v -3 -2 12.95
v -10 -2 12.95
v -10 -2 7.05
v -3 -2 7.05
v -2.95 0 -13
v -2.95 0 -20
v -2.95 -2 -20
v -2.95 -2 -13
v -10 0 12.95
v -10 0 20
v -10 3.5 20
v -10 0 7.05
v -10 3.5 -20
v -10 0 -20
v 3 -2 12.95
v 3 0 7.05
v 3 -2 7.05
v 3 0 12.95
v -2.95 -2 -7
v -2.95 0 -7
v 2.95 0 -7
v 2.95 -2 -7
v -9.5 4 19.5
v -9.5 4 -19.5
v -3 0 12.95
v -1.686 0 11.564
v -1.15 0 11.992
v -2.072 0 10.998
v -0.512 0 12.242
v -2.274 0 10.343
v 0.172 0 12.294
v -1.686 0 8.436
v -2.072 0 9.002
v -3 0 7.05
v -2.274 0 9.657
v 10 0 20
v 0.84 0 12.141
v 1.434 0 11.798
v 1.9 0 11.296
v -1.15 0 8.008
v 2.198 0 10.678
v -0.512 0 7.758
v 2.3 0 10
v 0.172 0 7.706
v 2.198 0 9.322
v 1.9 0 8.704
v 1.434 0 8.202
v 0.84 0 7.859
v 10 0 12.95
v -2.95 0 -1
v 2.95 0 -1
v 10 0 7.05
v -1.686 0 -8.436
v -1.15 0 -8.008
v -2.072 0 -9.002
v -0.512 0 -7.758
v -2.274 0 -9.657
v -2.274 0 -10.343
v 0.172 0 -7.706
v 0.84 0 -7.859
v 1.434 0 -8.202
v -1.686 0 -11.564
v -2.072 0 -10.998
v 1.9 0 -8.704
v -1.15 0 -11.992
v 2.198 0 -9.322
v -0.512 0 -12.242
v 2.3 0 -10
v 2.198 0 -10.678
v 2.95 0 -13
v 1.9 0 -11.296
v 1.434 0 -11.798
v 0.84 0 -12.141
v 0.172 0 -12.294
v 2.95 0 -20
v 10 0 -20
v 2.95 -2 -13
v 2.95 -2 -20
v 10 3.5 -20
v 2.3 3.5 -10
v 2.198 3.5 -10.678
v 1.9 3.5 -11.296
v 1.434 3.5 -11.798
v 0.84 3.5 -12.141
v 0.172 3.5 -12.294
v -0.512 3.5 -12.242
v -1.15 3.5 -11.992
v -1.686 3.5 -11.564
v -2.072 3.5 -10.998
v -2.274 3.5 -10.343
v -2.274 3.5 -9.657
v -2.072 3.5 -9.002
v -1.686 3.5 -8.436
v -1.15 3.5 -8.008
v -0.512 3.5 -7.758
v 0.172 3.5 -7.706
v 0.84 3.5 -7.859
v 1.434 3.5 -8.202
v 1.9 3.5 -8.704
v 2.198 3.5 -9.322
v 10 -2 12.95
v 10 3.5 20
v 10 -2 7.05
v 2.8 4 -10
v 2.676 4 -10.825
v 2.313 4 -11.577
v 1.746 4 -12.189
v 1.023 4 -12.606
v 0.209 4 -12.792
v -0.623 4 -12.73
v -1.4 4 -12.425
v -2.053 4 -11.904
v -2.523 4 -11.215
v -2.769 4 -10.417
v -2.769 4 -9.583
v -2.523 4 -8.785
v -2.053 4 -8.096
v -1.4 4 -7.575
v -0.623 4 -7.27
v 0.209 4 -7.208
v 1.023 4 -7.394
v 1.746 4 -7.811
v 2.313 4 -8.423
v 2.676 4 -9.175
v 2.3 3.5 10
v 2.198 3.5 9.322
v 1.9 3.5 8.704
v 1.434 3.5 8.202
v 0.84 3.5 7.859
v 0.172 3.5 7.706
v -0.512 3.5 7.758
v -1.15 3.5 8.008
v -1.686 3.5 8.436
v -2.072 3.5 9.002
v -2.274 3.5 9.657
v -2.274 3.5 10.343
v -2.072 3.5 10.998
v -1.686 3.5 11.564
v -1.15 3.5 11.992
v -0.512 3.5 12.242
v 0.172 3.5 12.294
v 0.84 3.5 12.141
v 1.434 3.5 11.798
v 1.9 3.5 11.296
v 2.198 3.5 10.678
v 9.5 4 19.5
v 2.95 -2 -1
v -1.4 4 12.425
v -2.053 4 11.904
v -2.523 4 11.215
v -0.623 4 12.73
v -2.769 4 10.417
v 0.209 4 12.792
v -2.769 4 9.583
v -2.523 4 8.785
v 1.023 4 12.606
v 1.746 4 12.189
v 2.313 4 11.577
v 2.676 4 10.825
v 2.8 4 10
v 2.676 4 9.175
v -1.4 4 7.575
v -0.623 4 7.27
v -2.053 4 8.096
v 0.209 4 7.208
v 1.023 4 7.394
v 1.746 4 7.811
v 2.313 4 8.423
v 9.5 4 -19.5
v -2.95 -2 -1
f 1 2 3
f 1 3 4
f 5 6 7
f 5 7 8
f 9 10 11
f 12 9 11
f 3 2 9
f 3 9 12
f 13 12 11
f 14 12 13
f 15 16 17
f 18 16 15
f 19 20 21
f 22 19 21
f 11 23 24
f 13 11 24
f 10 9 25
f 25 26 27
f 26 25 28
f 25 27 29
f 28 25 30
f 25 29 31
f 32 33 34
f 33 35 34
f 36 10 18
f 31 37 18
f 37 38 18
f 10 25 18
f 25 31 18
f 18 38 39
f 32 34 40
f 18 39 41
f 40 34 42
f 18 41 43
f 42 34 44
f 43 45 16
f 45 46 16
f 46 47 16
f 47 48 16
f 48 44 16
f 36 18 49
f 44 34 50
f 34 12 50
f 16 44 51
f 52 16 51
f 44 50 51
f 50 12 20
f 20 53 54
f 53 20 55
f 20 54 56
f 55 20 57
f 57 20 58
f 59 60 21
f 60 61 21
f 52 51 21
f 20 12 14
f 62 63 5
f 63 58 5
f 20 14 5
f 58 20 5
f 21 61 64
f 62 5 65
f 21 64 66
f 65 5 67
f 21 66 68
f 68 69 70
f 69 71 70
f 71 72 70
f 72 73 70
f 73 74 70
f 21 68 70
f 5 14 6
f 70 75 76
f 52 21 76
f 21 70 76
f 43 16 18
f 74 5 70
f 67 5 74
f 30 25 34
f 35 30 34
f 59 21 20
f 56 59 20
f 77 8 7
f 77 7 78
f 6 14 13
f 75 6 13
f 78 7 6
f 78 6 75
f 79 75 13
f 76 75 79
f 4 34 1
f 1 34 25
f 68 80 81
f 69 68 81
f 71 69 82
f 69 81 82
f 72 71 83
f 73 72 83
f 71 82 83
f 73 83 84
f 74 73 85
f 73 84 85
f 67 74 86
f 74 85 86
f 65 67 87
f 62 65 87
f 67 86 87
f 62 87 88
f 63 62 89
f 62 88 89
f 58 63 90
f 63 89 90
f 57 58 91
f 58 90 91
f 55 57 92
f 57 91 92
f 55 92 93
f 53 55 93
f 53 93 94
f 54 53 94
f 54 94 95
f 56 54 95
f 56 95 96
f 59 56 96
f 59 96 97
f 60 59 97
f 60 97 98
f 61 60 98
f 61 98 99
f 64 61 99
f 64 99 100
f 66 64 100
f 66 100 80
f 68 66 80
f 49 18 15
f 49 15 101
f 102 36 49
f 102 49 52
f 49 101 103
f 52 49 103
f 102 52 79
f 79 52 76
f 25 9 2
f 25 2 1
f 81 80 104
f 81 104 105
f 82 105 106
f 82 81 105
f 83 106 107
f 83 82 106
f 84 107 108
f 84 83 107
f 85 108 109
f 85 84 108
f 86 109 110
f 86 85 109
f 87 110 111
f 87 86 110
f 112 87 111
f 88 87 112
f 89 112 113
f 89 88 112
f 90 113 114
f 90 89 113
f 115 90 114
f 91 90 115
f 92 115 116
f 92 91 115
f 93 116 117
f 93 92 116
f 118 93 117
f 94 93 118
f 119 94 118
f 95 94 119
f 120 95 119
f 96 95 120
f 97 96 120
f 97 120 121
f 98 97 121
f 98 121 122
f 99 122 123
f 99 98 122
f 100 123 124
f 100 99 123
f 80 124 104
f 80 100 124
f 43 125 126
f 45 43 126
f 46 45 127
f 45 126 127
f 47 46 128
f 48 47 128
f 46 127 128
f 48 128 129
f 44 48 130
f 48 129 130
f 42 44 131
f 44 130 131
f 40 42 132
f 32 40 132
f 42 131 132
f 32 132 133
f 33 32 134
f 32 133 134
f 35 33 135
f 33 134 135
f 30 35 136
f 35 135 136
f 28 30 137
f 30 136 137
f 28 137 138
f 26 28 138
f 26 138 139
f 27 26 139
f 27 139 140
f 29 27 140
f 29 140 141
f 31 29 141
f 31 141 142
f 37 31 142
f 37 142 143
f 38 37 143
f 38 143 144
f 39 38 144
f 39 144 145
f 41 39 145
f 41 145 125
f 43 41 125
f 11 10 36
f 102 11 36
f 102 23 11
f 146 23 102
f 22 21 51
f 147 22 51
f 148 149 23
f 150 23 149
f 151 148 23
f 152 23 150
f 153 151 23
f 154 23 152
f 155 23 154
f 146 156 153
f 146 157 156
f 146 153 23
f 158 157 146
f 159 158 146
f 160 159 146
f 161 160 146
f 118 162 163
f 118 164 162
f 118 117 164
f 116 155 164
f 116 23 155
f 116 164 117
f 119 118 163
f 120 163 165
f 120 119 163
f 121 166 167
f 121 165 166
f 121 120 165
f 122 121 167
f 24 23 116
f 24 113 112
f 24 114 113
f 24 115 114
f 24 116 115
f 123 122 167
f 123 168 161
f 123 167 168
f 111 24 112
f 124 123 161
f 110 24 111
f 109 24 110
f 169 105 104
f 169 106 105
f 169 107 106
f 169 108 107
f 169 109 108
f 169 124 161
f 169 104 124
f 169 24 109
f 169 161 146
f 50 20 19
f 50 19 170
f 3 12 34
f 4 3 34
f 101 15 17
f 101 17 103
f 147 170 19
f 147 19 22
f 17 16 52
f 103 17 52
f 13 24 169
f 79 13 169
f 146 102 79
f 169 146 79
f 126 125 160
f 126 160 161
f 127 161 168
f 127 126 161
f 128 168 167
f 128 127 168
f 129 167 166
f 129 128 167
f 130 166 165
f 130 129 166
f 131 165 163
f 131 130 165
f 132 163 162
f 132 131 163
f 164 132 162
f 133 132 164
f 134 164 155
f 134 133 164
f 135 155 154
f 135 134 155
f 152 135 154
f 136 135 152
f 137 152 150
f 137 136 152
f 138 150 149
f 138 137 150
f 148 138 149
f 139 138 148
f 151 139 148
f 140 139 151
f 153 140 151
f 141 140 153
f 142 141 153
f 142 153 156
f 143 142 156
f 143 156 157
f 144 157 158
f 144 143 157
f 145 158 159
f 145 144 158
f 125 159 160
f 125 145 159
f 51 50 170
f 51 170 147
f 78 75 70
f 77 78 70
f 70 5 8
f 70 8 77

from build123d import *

# Parameters (mm, degrees)
ESBO_O1_W                  = 20
ESBO_O1_H                  = 40
RESSALTO_EXTRUS_O1_DEPTH   = 4
ESBO_O2_R                  = 2.3
CORTE_EXTRUS_O1_DEPTH      = 1
CORTE_EXTRUS_O1_DEPTH_BACK = 5
ESBO_O3_W                  = 5.9
ESBO_O3_H                  = 6
ESBO_O3_H_2                = 7
ESBO_O3_W_2                = 7
ESBO_O3_H_3                = 5.9
RESSALTO_EXTRUS_O2_DEPTH   = 2
CHANFRO1_SIZE              = 0.5


with BuildPart() as part:
    # Esboço1 → Ressalto-extrusão1 (new body)
    with BuildSketch(Plane(origin=(0, 0, 0), x_dir=(1, 0, 0), z_dir=(0, 1, 0))):
        Rectangle(ESBO_O1_W, ESBO_O1_H)
    extrude(amount=RESSALTO_EXTRUS_O1_DEPTH)

    # Esboço2 → Corte-extrusão1 (cut, two sides)
    with BuildSketch(Plane(origin=(0, 4, 0), x_dir=(1, 0, 0), z_dir=(0, 1, 0))) as corte_extrus_o1_sk:
        with Locations((0, 10)):
            Circle(ESBO_O2_R)
        with Locations((0, -10)):
            Circle(ESBO_O2_R)
    extrude(amount=CORTE_EXTRUS_O1_DEPTH, mode=Mode.SUBTRACT)
    extrude(corte_extrus_o1_sk.sketch, amount=-CORTE_EXTRUS_O1_DEPTH_BACK, mode=Mode.SUBTRACT)

    # Esboço3 → Ressalto-extrusão2 (add)
    with BuildSketch(Plane.XZ):
        with Locations((0, -4)):
            Rectangle(ESBO_O3_W, ESBO_O3_H)
        with Locations((0, -16.5)):
            Rectangle(ESBO_O3_W, ESBO_O3_H_2)
        with Locations((-6.5, 10)):
            Rectangle(ESBO_O3_W_2, ESBO_O3_H_3)
        with Locations((6.5, 10)):
            Rectangle(ESBO_O3_W_2, ESBO_O3_H_3)
    extrude(amount=RESSALTO_EXTRUS_O2_DEPTH)

    # Chanfro1
    chanfro1_edges = [part.edges().sort_by_distance(p)[0] for p in [
        (-10, 4, 0),
        (0, 4, 20),
        (-2.3, 4, -10),
        (-2.3, 4, 10),
        (10, 4, 0),
        (0, 4, -20),
    ]]
    chamfer(chanfro1_edges, length=CHANFRO1_SIZE)


solid = part.part
